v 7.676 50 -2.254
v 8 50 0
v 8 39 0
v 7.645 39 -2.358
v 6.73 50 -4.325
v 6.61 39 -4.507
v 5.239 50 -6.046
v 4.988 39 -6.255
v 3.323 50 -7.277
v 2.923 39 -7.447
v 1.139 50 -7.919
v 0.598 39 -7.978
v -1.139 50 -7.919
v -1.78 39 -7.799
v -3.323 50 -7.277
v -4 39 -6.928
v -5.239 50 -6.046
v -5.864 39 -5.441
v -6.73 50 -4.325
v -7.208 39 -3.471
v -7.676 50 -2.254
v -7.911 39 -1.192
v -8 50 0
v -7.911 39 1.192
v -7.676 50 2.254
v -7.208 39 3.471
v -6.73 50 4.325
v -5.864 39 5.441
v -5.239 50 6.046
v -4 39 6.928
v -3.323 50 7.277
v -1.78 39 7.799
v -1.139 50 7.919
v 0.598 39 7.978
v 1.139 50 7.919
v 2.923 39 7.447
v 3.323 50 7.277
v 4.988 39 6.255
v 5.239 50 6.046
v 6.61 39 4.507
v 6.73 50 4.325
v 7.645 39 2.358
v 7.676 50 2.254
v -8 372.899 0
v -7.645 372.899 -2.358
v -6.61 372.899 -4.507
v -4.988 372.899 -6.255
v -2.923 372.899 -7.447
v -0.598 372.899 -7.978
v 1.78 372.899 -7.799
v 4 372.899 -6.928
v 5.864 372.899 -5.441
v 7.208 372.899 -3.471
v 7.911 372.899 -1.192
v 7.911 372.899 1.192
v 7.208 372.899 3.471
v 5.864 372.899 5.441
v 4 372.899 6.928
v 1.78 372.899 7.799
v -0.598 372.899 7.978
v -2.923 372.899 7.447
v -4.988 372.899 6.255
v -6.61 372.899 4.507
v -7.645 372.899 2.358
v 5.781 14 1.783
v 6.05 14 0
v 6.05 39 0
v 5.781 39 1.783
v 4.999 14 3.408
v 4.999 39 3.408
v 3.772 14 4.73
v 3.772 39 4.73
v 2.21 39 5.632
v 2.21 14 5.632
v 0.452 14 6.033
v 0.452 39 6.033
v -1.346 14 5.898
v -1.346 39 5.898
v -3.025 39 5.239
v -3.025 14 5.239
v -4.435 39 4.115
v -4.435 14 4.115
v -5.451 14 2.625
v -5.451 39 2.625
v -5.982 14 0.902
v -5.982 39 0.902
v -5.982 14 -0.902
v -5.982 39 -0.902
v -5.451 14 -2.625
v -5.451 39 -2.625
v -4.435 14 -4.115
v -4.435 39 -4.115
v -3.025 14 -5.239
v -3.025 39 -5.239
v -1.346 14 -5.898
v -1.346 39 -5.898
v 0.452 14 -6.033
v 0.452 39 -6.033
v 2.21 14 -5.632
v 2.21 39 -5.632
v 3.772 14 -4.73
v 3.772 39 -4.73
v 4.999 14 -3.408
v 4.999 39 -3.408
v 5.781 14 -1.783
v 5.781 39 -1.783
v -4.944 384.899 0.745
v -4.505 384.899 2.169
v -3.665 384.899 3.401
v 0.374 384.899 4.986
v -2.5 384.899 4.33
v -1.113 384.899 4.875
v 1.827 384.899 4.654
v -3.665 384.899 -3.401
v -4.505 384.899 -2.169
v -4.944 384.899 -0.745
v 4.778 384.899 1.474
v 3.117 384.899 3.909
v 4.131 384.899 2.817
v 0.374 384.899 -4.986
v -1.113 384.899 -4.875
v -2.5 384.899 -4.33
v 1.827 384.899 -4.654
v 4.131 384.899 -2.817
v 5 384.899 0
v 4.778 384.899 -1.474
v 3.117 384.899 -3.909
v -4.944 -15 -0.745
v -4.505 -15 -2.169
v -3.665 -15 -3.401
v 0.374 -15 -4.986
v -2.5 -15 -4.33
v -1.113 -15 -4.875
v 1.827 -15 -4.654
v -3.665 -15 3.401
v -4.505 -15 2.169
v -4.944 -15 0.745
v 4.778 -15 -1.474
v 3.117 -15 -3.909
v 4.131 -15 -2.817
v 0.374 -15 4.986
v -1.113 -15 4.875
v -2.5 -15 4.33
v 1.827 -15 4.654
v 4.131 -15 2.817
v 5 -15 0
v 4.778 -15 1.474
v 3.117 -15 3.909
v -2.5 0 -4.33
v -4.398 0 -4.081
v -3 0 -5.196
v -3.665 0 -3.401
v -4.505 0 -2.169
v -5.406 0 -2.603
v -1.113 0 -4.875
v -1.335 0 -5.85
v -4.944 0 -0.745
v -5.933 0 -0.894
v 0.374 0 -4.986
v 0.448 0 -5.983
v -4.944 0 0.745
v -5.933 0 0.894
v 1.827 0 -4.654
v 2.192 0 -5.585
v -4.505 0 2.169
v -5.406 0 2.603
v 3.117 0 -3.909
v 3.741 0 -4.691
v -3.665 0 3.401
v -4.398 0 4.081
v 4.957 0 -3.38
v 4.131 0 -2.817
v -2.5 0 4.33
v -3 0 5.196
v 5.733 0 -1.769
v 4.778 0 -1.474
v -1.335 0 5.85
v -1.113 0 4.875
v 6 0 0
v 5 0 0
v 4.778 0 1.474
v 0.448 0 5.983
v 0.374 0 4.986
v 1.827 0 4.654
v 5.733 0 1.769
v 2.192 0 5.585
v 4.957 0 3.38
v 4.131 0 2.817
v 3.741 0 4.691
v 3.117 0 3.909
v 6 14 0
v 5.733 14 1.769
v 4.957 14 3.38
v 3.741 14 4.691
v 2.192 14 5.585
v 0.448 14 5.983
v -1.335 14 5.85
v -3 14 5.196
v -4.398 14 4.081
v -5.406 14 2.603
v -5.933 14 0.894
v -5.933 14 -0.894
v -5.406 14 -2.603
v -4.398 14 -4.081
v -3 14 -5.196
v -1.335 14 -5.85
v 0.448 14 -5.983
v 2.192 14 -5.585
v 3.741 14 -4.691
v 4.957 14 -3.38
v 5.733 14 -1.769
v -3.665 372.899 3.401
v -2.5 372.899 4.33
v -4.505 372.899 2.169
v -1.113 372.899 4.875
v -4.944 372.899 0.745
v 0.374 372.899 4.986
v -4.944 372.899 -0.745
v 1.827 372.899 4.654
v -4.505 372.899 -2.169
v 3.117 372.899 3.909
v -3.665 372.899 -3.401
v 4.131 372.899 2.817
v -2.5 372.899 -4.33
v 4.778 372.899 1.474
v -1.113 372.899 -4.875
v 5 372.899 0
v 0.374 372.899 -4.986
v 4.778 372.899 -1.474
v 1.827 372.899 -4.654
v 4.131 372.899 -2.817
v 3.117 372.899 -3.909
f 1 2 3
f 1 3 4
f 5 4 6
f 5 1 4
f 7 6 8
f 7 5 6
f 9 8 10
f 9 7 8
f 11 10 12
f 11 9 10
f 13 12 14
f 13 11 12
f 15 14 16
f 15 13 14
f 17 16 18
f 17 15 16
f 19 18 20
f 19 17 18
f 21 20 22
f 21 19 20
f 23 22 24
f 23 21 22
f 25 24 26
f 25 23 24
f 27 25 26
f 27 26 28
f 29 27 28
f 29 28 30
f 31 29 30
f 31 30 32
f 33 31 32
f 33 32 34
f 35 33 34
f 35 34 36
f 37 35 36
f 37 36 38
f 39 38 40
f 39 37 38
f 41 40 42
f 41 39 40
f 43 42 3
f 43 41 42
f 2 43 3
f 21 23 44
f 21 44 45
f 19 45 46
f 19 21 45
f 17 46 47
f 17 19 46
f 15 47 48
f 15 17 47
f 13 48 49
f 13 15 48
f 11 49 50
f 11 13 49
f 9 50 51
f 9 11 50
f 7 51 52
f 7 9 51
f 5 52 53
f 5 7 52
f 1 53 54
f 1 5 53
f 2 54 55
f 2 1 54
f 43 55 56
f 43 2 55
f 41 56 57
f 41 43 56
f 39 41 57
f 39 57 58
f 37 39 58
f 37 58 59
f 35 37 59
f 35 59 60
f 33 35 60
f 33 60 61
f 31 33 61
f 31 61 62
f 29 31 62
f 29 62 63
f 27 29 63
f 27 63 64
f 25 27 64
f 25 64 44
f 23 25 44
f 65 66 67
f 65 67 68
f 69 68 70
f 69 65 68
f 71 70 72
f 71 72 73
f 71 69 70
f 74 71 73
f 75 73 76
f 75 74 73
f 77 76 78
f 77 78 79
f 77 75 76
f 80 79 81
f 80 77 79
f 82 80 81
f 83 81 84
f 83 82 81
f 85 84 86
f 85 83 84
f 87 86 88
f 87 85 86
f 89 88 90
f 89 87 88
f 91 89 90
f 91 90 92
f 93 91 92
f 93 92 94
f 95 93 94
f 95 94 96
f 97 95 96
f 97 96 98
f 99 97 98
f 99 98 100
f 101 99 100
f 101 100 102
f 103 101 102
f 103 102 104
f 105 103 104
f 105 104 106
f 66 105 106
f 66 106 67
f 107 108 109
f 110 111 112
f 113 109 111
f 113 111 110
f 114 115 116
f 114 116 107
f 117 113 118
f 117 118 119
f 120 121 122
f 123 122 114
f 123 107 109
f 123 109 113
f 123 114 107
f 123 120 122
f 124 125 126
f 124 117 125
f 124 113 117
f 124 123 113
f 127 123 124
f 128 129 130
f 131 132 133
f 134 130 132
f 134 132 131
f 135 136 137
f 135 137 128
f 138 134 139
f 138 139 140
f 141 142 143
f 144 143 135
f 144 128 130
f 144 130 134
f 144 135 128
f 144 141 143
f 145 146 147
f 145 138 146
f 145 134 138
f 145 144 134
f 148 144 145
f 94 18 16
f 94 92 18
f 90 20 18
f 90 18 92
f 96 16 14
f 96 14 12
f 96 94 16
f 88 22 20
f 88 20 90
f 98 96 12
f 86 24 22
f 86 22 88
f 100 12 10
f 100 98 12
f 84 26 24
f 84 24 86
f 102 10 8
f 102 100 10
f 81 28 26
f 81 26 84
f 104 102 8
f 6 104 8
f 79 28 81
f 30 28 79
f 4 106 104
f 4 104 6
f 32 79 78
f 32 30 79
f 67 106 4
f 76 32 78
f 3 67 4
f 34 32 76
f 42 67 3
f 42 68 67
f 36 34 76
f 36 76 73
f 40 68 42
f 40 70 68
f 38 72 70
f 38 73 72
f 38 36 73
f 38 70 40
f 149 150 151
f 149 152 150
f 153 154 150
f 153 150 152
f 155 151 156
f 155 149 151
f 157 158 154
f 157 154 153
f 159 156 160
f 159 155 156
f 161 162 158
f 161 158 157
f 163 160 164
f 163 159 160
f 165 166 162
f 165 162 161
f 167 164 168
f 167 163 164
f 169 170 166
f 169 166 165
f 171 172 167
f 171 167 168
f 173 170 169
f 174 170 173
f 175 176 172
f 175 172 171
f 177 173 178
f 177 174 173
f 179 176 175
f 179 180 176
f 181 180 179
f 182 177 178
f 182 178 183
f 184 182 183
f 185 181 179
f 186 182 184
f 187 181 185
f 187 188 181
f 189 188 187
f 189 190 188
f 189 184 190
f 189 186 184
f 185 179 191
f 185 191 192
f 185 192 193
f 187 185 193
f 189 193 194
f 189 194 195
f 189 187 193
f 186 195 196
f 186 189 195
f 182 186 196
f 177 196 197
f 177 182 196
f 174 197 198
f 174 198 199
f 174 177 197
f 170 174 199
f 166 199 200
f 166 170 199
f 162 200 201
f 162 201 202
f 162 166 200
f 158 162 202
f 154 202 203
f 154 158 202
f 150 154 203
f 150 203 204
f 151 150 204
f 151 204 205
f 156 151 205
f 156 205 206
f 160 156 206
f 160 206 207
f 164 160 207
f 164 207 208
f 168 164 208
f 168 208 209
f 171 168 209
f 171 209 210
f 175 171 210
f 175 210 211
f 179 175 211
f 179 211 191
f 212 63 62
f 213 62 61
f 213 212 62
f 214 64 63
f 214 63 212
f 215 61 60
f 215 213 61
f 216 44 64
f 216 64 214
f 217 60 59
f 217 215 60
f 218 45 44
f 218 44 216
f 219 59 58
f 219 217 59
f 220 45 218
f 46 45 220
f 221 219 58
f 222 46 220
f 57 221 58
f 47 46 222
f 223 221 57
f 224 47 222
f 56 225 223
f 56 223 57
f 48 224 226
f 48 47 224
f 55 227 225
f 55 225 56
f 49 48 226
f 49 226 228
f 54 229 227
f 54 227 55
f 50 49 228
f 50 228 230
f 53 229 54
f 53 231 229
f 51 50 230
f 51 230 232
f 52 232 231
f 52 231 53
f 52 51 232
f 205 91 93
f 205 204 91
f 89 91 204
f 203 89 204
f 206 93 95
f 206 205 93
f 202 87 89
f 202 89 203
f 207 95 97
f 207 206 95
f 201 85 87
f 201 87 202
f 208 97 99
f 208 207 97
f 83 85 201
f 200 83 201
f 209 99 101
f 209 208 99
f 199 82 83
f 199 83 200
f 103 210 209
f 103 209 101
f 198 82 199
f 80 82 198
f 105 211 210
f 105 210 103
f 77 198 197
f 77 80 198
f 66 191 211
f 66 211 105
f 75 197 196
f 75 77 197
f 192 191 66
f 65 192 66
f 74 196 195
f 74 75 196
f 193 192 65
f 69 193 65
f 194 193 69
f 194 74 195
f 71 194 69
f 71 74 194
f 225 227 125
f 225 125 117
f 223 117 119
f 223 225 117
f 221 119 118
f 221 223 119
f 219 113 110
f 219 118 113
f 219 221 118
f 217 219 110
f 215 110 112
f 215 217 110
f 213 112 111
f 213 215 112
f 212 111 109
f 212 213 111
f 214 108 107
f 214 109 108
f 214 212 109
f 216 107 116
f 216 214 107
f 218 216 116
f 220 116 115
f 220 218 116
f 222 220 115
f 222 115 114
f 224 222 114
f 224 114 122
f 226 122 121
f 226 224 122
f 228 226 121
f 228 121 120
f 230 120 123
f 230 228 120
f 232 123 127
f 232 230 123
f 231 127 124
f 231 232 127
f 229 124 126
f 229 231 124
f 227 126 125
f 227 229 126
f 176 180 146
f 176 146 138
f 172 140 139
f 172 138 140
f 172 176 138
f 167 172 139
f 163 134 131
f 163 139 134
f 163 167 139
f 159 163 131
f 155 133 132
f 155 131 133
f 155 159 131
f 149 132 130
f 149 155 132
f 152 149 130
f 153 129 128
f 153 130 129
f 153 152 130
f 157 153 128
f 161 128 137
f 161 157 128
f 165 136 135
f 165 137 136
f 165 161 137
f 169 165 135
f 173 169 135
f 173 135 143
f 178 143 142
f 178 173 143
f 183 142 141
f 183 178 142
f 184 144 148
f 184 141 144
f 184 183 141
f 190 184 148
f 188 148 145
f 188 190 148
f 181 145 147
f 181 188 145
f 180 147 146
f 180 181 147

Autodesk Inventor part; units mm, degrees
ref_plane "YZ Plane" through (0, 0, 0) normal (1, 0, 0) x (0, 1, 0)
ref_plane "XZ Plane" through (0, 0, 0) normal (0, 1, 0) x (-1, 0, 0)
ref_plane "XY Plane" through (0, 0, 0) normal (0, 0, 1) x (1, 0, 0)
sketch "Sketch1" plane through (0, 0, 0) normal (0, 1, 0) x (-1, 0, 0)
  circle A0 centre (0, 0) radius 8
  dimension "d0" = 16
extrude "Extrusion1" add sketch "Sketch1" along normal blind 400
sketch "Sketch2" plane through (0, 0, 0) normal (0, -1, 0) x (1, 0, 0)
  circle A0 centre (0, 0) radius 8 projected
extrude "Extrusion2" cut sketch "Sketch2" against normal blind 50
sketch "Sketch3" plane through (0, 50, 0) normal (0, -1, 0) x (1, 0, 0)
  circle A0 centre (0, 0) radius 8 projected
extrude "Extrusion3" add sketch "Sketch3" along normal blind 50
sketch "Sketch4" plane through (0, 0, 0) normal (0, -1, 0) x (1, 0, 0)
  circle A0 centre (0, 0) radius 8 projected
  circle A1 centre (0, 0) radius 6
  dimension "d7" = 12
extrude "Extrusion4" cut sketch "Sketch4" against normal blind 14
thread "Thread1" size "M12x1" class "6g" standard "ANSI Metric M Profile" full length
sketch "Sketch6" plane through (0, 14, 0) normal (0, -1, 0) x (1, 0, 0)
  circle A0 centre (0, 0) radius 8 projected
  circle A1 centre (0, 0) radius 6.05
  dimension "d13" = 12.1
extrude "Extrusion5" cut sketch "Sketch6" against normal blind 25
sketch "Sketch7" plane through (0, 0, 0) normal (0, -1, 0) x (1, 0, 0)
  circle A0 centre (0, 0) radius 6 projected
  circle A1 centre (0, 0) radius 5
  dimension "d16" = 10
extrude "Extrusion6" add sketch "Sketch7" along normal blind 15 contours A1
sketch "Sketch8" plane through (0, 400, 0) normal (0, 1, 0) x (1, 0, 0)
  circle A0 centre (0, 0) radius 8 projected
extrude "Extrusion7" cut sketch "Sketch8" against normal blind 27.101
sketch "Sketch9" plane through (0, 372.899, 0) normal (0, 1, 0) x (1, 0, 0)
  circle A0 centre (0, 0) radius 8 projected
  circle A1 centre (0, 0) radius 5
  dimension "d21" = 10
extrude "Extrusion8" add sketch "Sketch9" along normal blind 12 contours A1
properties part number "1605_400mm"
